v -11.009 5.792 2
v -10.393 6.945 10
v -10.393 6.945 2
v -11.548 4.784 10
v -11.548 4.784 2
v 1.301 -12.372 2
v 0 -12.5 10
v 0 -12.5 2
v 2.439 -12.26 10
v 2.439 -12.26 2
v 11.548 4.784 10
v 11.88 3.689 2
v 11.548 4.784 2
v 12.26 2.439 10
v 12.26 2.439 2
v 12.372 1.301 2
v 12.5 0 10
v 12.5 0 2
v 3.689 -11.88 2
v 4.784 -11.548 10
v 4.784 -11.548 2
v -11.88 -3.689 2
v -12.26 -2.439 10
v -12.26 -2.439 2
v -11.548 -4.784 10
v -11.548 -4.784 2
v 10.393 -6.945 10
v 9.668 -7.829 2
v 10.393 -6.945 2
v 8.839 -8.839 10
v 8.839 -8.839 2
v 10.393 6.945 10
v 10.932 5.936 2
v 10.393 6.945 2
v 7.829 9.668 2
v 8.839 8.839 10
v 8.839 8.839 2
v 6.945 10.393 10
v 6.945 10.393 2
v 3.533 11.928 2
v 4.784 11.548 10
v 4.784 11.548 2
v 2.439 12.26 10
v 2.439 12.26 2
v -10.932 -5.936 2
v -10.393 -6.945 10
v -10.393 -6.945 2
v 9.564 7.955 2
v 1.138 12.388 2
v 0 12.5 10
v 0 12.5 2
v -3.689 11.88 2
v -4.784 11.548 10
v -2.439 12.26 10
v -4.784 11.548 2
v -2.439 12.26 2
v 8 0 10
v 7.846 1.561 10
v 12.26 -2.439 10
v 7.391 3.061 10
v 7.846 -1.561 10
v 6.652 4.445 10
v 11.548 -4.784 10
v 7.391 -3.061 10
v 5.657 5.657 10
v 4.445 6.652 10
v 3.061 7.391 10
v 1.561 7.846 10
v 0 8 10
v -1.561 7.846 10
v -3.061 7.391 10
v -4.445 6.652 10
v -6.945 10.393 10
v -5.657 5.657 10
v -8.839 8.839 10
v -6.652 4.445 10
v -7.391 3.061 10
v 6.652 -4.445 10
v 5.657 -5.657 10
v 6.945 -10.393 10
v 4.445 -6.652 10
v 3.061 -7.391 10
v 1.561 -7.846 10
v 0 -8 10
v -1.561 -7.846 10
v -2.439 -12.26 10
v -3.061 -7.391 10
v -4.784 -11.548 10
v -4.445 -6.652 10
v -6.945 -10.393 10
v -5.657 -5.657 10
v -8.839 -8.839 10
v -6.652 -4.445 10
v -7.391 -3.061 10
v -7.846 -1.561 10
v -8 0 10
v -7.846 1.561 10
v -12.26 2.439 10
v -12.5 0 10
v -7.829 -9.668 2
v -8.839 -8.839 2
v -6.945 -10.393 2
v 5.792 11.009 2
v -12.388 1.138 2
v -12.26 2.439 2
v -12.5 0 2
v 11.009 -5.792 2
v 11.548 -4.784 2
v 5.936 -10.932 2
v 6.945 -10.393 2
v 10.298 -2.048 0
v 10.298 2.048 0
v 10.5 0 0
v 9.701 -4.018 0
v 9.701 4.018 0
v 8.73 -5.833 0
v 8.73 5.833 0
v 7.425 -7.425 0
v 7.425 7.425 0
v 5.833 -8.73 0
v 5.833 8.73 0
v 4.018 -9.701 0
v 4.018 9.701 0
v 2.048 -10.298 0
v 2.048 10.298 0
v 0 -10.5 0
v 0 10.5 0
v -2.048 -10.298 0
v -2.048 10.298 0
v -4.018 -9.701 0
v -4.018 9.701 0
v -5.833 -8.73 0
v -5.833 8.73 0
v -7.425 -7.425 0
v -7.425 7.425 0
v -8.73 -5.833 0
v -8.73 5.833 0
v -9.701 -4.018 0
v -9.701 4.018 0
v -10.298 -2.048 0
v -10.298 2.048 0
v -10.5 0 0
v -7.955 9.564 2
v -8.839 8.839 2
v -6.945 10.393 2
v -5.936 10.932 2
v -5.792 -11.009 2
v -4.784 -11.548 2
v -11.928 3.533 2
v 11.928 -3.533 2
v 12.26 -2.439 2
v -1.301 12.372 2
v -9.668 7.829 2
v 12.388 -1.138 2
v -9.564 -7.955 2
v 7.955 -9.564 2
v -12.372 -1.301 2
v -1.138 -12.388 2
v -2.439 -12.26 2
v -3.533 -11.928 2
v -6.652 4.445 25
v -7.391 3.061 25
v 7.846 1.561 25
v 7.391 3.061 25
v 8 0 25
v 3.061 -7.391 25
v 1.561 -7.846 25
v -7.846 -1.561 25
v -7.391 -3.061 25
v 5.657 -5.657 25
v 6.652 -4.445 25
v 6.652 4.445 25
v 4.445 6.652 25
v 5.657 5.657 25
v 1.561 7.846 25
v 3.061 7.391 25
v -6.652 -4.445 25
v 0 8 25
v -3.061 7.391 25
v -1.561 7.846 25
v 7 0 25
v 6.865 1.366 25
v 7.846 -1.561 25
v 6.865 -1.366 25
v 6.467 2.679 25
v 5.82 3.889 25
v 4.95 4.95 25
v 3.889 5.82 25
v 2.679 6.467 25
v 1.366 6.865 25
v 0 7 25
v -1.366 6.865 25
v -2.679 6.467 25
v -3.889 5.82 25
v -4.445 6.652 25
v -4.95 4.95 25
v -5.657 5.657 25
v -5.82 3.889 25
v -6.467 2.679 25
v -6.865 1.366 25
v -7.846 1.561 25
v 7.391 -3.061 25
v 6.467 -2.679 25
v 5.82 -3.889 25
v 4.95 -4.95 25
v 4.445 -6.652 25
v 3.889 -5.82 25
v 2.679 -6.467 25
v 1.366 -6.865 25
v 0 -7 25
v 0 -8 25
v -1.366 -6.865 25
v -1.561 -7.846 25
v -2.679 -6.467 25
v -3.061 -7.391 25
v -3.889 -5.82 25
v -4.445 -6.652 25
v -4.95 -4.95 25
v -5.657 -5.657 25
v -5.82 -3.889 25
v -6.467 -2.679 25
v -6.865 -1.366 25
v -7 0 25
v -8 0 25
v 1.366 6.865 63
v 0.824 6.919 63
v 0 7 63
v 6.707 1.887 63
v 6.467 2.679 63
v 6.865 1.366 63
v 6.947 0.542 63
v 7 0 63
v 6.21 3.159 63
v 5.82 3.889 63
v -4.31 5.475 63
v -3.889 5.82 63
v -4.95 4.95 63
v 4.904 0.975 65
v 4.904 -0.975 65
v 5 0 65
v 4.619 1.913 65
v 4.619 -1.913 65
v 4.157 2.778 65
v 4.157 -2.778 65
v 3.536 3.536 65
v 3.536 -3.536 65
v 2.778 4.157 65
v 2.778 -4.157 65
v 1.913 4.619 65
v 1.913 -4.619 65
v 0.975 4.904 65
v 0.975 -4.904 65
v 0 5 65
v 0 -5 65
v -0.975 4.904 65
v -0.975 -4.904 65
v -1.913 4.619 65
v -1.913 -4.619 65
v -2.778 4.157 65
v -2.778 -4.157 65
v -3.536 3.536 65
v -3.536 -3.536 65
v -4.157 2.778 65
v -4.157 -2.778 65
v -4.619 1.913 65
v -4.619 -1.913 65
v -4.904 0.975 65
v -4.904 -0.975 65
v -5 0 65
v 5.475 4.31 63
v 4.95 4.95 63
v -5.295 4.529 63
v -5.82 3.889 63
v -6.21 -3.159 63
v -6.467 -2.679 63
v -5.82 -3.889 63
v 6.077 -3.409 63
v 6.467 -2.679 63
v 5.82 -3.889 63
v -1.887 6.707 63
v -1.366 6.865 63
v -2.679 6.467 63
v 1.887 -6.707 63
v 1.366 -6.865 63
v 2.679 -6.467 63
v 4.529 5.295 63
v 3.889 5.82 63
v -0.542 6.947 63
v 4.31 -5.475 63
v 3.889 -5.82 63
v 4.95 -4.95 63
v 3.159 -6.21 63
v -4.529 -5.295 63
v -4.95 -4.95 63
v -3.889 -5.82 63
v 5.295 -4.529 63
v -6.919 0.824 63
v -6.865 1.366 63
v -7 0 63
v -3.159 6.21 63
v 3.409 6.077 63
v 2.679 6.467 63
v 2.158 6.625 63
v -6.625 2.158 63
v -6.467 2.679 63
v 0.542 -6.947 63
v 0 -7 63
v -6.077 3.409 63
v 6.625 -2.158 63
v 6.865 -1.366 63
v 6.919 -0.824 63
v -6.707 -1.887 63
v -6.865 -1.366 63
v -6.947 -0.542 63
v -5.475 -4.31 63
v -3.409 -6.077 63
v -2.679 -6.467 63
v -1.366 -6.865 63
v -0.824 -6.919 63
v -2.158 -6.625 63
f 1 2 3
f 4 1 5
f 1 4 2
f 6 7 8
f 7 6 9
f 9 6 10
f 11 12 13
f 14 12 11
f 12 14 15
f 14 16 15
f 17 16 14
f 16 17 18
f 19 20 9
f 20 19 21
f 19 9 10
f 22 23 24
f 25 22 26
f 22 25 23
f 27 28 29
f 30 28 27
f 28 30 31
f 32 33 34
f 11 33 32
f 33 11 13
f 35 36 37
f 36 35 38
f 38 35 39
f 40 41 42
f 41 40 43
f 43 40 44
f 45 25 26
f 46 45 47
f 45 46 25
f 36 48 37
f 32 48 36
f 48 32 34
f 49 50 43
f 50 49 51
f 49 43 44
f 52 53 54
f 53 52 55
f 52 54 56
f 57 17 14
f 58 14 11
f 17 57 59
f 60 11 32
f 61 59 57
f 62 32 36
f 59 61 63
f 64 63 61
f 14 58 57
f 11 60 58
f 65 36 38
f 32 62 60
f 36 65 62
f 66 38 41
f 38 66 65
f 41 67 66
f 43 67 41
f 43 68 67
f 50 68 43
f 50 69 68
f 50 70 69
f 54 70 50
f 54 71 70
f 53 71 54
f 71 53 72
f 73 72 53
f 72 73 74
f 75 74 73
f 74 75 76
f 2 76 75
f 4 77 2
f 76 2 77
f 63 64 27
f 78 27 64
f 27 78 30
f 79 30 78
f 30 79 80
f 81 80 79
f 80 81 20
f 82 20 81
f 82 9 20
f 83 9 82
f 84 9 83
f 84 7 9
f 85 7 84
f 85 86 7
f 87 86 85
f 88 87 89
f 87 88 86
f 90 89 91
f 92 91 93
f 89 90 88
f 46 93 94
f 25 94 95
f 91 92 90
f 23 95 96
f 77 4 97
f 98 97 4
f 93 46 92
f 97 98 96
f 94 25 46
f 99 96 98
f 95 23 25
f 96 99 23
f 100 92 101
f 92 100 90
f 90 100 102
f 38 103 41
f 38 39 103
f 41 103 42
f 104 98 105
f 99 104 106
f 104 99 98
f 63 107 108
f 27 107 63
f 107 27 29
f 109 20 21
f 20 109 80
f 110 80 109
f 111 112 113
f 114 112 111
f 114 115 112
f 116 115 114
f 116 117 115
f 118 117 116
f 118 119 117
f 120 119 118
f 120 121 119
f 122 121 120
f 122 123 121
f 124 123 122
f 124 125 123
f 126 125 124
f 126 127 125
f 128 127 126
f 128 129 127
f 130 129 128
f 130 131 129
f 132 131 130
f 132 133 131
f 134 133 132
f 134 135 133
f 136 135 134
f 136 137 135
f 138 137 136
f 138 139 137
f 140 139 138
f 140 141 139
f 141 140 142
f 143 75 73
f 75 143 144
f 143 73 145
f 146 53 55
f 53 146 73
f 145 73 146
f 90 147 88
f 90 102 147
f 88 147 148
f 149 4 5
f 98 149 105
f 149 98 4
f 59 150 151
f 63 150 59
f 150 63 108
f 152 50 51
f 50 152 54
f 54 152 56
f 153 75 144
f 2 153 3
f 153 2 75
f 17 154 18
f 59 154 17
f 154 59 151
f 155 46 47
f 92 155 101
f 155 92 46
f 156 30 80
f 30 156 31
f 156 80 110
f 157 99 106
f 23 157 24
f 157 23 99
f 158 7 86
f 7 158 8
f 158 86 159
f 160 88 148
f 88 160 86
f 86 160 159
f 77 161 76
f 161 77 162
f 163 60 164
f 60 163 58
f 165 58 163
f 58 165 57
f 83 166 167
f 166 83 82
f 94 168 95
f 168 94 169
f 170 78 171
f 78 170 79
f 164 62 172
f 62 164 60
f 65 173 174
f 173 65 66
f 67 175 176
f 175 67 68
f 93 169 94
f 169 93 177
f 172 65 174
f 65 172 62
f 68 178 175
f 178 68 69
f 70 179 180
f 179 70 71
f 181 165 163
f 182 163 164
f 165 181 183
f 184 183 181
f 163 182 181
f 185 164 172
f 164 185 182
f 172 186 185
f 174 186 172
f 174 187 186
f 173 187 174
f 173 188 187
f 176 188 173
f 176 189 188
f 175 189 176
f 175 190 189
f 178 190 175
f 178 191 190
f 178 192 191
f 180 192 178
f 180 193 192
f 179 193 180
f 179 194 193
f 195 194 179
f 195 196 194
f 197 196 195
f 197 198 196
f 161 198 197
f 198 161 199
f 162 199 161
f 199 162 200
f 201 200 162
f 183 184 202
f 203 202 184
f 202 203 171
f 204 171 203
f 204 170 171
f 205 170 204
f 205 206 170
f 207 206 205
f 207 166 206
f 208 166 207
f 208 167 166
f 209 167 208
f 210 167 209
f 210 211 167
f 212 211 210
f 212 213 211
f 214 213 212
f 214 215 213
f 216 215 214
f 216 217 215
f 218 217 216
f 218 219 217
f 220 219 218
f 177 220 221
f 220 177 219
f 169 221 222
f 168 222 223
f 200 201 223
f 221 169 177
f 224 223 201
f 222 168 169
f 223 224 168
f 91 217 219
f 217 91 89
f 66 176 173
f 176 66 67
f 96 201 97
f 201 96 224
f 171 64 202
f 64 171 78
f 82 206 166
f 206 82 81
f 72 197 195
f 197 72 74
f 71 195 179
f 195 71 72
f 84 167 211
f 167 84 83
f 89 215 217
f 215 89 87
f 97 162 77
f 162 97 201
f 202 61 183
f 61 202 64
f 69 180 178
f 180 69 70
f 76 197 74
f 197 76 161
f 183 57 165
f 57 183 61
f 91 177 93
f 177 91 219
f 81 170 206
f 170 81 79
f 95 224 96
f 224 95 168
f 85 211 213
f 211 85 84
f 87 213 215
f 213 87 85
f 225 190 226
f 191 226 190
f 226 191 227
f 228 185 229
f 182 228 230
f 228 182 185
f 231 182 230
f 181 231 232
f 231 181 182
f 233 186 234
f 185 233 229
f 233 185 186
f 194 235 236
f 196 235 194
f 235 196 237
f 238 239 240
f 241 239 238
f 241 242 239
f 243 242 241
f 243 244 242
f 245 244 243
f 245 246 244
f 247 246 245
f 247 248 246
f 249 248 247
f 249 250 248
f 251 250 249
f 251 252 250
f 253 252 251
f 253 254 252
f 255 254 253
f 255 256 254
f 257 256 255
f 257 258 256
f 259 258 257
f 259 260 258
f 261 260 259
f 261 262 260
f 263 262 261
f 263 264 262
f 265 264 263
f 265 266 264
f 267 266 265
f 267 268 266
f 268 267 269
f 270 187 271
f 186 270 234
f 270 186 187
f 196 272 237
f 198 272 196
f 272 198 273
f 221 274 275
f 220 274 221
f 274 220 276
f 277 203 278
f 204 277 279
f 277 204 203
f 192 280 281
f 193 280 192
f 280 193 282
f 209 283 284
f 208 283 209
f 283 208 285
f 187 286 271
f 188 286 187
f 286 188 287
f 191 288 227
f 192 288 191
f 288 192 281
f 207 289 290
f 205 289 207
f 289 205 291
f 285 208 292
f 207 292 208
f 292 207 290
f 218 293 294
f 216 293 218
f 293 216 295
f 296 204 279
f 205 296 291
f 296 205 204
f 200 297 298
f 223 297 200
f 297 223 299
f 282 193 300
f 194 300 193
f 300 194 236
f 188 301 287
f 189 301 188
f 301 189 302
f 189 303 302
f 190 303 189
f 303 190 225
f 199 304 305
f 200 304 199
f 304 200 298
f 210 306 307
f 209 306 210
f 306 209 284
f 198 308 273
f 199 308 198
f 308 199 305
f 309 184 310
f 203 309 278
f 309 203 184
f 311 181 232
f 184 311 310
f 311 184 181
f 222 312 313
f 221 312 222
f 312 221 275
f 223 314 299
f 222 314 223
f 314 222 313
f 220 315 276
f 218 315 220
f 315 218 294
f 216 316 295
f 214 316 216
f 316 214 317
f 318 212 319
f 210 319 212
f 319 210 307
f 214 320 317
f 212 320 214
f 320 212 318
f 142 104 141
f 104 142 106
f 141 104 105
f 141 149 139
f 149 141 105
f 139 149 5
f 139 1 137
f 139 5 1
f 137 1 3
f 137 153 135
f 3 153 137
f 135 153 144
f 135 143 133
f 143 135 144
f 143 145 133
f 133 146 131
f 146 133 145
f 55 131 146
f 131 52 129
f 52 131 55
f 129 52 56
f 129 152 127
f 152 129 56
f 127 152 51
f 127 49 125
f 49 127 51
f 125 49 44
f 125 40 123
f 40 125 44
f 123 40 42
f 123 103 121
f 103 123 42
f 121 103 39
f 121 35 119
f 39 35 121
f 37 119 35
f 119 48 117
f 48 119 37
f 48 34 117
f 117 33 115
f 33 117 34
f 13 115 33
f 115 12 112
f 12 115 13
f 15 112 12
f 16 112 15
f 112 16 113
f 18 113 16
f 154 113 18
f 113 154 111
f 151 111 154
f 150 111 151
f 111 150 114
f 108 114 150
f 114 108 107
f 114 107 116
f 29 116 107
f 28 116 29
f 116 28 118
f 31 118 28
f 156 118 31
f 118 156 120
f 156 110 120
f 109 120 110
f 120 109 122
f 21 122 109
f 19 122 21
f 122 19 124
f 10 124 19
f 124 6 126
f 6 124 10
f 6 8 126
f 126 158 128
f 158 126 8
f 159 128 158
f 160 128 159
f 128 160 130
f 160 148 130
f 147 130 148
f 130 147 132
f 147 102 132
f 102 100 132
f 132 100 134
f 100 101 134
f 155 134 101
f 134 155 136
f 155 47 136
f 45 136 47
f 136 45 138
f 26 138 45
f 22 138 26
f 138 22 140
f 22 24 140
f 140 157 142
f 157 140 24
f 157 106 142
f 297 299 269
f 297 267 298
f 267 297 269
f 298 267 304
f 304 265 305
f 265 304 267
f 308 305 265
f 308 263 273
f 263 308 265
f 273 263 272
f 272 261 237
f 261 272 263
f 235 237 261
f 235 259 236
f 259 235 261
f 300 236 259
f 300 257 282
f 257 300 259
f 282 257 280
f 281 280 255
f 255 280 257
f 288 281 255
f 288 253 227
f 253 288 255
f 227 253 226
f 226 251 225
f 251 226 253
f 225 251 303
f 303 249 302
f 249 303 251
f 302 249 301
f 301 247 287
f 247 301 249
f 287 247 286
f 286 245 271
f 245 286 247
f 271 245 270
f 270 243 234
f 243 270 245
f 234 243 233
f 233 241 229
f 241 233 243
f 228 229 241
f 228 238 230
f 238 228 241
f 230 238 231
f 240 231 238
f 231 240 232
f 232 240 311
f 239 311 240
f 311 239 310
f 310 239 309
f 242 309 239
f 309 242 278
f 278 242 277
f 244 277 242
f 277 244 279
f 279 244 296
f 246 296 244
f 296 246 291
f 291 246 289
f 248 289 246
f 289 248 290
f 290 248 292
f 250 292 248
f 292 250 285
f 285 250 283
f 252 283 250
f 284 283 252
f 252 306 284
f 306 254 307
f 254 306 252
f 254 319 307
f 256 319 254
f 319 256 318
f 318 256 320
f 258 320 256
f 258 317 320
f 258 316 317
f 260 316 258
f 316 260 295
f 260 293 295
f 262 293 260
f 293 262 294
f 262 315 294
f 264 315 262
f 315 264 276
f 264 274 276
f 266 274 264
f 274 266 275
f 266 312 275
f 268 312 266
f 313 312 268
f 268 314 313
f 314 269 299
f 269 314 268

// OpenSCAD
$fn = 32;

// ----------------------------------------------------------------------
// Stepped shaft: diameters 25, 16, 14 mm, 65 mm long
// ----------------------------------------------------------------------

// --- parameters (mm) ---
d1 = 25;                  // step 1 diameter
len1 = 10;                // step 1 length
d2 = 16;                  // step 2 diameter
len2 = 15;                // step 2 length
d3 = 14;                  // step 3 diameter
len3 = 40;                // step 3 length
total = 65;               // overall length
chamfer = 2;              // end chamfer

difference() {
  /* turned body: stacked cylinders, every step sunk into the bigger one */
  union() {
    cylinder(h = len1, d = d1);
    translate([0, 0, 9.6]) cylinder(h = 15.4, d = d2);
    translate([0, 0, 24.6]) cylinder(h = 40.4, d = d3);
  }
  /* bottom chamfer ring cut */
  rotate_extrude() translate([10.5, -2.5]) polygon([[0, 0], [4.5, 0], [4.5, 7], [0, 2.5]]);
  /* top chamfer ring cut */
  rotate_extrude() translate([5, 65]) polygon([[0, 0], [4.5, -4.5], [4.5, 2.5], [0, 2.5]]);
}
